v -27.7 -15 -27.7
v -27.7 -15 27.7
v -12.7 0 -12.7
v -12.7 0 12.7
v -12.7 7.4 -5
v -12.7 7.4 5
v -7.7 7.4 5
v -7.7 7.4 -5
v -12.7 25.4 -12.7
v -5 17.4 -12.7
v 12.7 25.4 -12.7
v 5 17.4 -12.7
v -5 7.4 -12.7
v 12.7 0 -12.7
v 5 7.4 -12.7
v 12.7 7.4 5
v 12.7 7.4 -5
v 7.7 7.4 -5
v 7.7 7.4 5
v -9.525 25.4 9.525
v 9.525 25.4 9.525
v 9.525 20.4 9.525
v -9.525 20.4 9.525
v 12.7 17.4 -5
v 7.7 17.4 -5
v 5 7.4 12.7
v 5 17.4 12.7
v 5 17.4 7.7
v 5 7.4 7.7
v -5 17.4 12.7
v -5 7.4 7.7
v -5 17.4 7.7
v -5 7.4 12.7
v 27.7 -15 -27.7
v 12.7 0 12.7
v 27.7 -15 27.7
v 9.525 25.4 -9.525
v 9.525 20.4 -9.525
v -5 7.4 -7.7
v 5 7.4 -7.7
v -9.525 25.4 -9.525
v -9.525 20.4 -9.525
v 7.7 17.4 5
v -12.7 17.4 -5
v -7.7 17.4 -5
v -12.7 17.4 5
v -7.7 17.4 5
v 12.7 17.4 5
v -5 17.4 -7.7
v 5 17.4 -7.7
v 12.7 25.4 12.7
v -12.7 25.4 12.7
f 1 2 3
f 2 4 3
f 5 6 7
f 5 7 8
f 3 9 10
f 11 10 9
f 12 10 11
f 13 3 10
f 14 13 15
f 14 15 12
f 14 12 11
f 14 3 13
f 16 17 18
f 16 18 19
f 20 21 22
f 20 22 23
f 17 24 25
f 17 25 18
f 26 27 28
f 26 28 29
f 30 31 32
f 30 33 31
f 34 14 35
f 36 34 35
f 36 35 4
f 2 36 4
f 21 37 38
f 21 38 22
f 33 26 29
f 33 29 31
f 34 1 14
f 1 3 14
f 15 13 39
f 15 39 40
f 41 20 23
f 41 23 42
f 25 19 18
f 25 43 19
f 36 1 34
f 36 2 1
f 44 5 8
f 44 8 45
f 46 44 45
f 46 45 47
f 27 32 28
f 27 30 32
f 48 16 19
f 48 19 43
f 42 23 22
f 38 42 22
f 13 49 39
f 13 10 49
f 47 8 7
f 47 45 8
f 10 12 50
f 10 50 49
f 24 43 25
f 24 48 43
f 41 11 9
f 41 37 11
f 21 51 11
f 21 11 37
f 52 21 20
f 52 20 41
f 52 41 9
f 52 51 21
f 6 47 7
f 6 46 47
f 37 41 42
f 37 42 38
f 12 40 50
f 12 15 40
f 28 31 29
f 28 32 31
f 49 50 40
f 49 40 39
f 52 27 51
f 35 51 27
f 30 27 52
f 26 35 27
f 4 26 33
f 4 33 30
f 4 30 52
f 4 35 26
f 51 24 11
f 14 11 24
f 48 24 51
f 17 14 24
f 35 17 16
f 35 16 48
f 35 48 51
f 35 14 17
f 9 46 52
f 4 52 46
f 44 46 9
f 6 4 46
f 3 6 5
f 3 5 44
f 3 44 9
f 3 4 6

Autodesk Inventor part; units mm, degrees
ref_plane "YZ Plane" through (0, 0, 0) normal (1, 0, 0) x (0, 1, 0)
ref_plane "XZ Plane" through (0, 0, 0) normal (0, 1, 0) x (-1, 0, 0)
ref_plane "XY Plane" through (0, 0, 0) normal (0, 0, 1) x (1, 0, 0)
sketch "Sketch1" plane through (0, 0, 0) normal (0, 1, 0) x (-1, 0, 0)
  line L0 (-12.7, -12.7) -> (-12.7, 12.7)
  line L1 (-12.7, 12.7) -> (12.7, 12.7)
  line L2 (12.7, 12.7) -> (12.7, -12.7)
  line L3 (12.7, -12.7) -> (-12.7, -12.7)
  point P0 (0, 0)
  point P1 (0, 0)
  dimension "d0" = 25.4
extrude "Extrusion1" add sketch "Sketch1" along normal blind 25.4
sketch "Sketch2" plane through (0, 25.4, 0) normal (0, 1, 0) x (1, 0, 0)
  line L0 (9.525, 9.525) -> (9.525, -9.525)
  line L1 (9.525, -9.525) -> (-9.525, -9.525)
  line L2 (-9.525, -9.525) -> (-9.525, 9.525)
  line L3 (-9.525, 9.525) -> (9.525, 9.525)
  point P0 (0, 0)
  point P1 (0, 0)
  dimension "d3" = 19.05
extrude "Extrusion2" cut sketch "Sketch2" against normal blind 5
sketch "Sketch3" plane through (12.7, 0, 12.7) normal (1, 0, 0) x (0, 0, -1)
  line L0 (22.225, 20.4) -> (3.175, 20.4) projected
  line L1 (17.7, 7.4) -> (7.7, 7.4)
  line L2 (7.7, 7.4) -> (7.7, 17.4)
  line L3 (7.7, 17.4) -> (17.7, 17.4)
  line L4 (17.7, 17.4) -> (17.7, 7.4)
  point P0 (12.7, 0)
  point P1 (12.7, 12.4)
  dimension "d6" = 10
extrude "Extrusion3" cut sketch "Sketch3" against normal blind 5
pattern_circular "Circular Pattern1" count 4 over 360 about axis through (0, -10, 0) along (0, 1, 0) of "Extrusion3"
sketch "Sketch4" plane through (0, 0, 0) normal (0, -1, 0) x (1, 0, 0)
  line L0 (12.7, -12.7) -> (12.7, 12.7) projected
  line L1 (12.7, 12.7) -> (-12.7, 12.7) projected
  line L2 (-12.7, 12.7) -> (-12.7, -12.7) projected
  line L3 (-12.7, -12.7) -> (12.7, -12.7) projected
  point P0 (0, 0)
extrude "Extrusion4" add sketch "Sketch4" along normal blind 15 draft 45
properties part number "frame_nexus_2_base"
